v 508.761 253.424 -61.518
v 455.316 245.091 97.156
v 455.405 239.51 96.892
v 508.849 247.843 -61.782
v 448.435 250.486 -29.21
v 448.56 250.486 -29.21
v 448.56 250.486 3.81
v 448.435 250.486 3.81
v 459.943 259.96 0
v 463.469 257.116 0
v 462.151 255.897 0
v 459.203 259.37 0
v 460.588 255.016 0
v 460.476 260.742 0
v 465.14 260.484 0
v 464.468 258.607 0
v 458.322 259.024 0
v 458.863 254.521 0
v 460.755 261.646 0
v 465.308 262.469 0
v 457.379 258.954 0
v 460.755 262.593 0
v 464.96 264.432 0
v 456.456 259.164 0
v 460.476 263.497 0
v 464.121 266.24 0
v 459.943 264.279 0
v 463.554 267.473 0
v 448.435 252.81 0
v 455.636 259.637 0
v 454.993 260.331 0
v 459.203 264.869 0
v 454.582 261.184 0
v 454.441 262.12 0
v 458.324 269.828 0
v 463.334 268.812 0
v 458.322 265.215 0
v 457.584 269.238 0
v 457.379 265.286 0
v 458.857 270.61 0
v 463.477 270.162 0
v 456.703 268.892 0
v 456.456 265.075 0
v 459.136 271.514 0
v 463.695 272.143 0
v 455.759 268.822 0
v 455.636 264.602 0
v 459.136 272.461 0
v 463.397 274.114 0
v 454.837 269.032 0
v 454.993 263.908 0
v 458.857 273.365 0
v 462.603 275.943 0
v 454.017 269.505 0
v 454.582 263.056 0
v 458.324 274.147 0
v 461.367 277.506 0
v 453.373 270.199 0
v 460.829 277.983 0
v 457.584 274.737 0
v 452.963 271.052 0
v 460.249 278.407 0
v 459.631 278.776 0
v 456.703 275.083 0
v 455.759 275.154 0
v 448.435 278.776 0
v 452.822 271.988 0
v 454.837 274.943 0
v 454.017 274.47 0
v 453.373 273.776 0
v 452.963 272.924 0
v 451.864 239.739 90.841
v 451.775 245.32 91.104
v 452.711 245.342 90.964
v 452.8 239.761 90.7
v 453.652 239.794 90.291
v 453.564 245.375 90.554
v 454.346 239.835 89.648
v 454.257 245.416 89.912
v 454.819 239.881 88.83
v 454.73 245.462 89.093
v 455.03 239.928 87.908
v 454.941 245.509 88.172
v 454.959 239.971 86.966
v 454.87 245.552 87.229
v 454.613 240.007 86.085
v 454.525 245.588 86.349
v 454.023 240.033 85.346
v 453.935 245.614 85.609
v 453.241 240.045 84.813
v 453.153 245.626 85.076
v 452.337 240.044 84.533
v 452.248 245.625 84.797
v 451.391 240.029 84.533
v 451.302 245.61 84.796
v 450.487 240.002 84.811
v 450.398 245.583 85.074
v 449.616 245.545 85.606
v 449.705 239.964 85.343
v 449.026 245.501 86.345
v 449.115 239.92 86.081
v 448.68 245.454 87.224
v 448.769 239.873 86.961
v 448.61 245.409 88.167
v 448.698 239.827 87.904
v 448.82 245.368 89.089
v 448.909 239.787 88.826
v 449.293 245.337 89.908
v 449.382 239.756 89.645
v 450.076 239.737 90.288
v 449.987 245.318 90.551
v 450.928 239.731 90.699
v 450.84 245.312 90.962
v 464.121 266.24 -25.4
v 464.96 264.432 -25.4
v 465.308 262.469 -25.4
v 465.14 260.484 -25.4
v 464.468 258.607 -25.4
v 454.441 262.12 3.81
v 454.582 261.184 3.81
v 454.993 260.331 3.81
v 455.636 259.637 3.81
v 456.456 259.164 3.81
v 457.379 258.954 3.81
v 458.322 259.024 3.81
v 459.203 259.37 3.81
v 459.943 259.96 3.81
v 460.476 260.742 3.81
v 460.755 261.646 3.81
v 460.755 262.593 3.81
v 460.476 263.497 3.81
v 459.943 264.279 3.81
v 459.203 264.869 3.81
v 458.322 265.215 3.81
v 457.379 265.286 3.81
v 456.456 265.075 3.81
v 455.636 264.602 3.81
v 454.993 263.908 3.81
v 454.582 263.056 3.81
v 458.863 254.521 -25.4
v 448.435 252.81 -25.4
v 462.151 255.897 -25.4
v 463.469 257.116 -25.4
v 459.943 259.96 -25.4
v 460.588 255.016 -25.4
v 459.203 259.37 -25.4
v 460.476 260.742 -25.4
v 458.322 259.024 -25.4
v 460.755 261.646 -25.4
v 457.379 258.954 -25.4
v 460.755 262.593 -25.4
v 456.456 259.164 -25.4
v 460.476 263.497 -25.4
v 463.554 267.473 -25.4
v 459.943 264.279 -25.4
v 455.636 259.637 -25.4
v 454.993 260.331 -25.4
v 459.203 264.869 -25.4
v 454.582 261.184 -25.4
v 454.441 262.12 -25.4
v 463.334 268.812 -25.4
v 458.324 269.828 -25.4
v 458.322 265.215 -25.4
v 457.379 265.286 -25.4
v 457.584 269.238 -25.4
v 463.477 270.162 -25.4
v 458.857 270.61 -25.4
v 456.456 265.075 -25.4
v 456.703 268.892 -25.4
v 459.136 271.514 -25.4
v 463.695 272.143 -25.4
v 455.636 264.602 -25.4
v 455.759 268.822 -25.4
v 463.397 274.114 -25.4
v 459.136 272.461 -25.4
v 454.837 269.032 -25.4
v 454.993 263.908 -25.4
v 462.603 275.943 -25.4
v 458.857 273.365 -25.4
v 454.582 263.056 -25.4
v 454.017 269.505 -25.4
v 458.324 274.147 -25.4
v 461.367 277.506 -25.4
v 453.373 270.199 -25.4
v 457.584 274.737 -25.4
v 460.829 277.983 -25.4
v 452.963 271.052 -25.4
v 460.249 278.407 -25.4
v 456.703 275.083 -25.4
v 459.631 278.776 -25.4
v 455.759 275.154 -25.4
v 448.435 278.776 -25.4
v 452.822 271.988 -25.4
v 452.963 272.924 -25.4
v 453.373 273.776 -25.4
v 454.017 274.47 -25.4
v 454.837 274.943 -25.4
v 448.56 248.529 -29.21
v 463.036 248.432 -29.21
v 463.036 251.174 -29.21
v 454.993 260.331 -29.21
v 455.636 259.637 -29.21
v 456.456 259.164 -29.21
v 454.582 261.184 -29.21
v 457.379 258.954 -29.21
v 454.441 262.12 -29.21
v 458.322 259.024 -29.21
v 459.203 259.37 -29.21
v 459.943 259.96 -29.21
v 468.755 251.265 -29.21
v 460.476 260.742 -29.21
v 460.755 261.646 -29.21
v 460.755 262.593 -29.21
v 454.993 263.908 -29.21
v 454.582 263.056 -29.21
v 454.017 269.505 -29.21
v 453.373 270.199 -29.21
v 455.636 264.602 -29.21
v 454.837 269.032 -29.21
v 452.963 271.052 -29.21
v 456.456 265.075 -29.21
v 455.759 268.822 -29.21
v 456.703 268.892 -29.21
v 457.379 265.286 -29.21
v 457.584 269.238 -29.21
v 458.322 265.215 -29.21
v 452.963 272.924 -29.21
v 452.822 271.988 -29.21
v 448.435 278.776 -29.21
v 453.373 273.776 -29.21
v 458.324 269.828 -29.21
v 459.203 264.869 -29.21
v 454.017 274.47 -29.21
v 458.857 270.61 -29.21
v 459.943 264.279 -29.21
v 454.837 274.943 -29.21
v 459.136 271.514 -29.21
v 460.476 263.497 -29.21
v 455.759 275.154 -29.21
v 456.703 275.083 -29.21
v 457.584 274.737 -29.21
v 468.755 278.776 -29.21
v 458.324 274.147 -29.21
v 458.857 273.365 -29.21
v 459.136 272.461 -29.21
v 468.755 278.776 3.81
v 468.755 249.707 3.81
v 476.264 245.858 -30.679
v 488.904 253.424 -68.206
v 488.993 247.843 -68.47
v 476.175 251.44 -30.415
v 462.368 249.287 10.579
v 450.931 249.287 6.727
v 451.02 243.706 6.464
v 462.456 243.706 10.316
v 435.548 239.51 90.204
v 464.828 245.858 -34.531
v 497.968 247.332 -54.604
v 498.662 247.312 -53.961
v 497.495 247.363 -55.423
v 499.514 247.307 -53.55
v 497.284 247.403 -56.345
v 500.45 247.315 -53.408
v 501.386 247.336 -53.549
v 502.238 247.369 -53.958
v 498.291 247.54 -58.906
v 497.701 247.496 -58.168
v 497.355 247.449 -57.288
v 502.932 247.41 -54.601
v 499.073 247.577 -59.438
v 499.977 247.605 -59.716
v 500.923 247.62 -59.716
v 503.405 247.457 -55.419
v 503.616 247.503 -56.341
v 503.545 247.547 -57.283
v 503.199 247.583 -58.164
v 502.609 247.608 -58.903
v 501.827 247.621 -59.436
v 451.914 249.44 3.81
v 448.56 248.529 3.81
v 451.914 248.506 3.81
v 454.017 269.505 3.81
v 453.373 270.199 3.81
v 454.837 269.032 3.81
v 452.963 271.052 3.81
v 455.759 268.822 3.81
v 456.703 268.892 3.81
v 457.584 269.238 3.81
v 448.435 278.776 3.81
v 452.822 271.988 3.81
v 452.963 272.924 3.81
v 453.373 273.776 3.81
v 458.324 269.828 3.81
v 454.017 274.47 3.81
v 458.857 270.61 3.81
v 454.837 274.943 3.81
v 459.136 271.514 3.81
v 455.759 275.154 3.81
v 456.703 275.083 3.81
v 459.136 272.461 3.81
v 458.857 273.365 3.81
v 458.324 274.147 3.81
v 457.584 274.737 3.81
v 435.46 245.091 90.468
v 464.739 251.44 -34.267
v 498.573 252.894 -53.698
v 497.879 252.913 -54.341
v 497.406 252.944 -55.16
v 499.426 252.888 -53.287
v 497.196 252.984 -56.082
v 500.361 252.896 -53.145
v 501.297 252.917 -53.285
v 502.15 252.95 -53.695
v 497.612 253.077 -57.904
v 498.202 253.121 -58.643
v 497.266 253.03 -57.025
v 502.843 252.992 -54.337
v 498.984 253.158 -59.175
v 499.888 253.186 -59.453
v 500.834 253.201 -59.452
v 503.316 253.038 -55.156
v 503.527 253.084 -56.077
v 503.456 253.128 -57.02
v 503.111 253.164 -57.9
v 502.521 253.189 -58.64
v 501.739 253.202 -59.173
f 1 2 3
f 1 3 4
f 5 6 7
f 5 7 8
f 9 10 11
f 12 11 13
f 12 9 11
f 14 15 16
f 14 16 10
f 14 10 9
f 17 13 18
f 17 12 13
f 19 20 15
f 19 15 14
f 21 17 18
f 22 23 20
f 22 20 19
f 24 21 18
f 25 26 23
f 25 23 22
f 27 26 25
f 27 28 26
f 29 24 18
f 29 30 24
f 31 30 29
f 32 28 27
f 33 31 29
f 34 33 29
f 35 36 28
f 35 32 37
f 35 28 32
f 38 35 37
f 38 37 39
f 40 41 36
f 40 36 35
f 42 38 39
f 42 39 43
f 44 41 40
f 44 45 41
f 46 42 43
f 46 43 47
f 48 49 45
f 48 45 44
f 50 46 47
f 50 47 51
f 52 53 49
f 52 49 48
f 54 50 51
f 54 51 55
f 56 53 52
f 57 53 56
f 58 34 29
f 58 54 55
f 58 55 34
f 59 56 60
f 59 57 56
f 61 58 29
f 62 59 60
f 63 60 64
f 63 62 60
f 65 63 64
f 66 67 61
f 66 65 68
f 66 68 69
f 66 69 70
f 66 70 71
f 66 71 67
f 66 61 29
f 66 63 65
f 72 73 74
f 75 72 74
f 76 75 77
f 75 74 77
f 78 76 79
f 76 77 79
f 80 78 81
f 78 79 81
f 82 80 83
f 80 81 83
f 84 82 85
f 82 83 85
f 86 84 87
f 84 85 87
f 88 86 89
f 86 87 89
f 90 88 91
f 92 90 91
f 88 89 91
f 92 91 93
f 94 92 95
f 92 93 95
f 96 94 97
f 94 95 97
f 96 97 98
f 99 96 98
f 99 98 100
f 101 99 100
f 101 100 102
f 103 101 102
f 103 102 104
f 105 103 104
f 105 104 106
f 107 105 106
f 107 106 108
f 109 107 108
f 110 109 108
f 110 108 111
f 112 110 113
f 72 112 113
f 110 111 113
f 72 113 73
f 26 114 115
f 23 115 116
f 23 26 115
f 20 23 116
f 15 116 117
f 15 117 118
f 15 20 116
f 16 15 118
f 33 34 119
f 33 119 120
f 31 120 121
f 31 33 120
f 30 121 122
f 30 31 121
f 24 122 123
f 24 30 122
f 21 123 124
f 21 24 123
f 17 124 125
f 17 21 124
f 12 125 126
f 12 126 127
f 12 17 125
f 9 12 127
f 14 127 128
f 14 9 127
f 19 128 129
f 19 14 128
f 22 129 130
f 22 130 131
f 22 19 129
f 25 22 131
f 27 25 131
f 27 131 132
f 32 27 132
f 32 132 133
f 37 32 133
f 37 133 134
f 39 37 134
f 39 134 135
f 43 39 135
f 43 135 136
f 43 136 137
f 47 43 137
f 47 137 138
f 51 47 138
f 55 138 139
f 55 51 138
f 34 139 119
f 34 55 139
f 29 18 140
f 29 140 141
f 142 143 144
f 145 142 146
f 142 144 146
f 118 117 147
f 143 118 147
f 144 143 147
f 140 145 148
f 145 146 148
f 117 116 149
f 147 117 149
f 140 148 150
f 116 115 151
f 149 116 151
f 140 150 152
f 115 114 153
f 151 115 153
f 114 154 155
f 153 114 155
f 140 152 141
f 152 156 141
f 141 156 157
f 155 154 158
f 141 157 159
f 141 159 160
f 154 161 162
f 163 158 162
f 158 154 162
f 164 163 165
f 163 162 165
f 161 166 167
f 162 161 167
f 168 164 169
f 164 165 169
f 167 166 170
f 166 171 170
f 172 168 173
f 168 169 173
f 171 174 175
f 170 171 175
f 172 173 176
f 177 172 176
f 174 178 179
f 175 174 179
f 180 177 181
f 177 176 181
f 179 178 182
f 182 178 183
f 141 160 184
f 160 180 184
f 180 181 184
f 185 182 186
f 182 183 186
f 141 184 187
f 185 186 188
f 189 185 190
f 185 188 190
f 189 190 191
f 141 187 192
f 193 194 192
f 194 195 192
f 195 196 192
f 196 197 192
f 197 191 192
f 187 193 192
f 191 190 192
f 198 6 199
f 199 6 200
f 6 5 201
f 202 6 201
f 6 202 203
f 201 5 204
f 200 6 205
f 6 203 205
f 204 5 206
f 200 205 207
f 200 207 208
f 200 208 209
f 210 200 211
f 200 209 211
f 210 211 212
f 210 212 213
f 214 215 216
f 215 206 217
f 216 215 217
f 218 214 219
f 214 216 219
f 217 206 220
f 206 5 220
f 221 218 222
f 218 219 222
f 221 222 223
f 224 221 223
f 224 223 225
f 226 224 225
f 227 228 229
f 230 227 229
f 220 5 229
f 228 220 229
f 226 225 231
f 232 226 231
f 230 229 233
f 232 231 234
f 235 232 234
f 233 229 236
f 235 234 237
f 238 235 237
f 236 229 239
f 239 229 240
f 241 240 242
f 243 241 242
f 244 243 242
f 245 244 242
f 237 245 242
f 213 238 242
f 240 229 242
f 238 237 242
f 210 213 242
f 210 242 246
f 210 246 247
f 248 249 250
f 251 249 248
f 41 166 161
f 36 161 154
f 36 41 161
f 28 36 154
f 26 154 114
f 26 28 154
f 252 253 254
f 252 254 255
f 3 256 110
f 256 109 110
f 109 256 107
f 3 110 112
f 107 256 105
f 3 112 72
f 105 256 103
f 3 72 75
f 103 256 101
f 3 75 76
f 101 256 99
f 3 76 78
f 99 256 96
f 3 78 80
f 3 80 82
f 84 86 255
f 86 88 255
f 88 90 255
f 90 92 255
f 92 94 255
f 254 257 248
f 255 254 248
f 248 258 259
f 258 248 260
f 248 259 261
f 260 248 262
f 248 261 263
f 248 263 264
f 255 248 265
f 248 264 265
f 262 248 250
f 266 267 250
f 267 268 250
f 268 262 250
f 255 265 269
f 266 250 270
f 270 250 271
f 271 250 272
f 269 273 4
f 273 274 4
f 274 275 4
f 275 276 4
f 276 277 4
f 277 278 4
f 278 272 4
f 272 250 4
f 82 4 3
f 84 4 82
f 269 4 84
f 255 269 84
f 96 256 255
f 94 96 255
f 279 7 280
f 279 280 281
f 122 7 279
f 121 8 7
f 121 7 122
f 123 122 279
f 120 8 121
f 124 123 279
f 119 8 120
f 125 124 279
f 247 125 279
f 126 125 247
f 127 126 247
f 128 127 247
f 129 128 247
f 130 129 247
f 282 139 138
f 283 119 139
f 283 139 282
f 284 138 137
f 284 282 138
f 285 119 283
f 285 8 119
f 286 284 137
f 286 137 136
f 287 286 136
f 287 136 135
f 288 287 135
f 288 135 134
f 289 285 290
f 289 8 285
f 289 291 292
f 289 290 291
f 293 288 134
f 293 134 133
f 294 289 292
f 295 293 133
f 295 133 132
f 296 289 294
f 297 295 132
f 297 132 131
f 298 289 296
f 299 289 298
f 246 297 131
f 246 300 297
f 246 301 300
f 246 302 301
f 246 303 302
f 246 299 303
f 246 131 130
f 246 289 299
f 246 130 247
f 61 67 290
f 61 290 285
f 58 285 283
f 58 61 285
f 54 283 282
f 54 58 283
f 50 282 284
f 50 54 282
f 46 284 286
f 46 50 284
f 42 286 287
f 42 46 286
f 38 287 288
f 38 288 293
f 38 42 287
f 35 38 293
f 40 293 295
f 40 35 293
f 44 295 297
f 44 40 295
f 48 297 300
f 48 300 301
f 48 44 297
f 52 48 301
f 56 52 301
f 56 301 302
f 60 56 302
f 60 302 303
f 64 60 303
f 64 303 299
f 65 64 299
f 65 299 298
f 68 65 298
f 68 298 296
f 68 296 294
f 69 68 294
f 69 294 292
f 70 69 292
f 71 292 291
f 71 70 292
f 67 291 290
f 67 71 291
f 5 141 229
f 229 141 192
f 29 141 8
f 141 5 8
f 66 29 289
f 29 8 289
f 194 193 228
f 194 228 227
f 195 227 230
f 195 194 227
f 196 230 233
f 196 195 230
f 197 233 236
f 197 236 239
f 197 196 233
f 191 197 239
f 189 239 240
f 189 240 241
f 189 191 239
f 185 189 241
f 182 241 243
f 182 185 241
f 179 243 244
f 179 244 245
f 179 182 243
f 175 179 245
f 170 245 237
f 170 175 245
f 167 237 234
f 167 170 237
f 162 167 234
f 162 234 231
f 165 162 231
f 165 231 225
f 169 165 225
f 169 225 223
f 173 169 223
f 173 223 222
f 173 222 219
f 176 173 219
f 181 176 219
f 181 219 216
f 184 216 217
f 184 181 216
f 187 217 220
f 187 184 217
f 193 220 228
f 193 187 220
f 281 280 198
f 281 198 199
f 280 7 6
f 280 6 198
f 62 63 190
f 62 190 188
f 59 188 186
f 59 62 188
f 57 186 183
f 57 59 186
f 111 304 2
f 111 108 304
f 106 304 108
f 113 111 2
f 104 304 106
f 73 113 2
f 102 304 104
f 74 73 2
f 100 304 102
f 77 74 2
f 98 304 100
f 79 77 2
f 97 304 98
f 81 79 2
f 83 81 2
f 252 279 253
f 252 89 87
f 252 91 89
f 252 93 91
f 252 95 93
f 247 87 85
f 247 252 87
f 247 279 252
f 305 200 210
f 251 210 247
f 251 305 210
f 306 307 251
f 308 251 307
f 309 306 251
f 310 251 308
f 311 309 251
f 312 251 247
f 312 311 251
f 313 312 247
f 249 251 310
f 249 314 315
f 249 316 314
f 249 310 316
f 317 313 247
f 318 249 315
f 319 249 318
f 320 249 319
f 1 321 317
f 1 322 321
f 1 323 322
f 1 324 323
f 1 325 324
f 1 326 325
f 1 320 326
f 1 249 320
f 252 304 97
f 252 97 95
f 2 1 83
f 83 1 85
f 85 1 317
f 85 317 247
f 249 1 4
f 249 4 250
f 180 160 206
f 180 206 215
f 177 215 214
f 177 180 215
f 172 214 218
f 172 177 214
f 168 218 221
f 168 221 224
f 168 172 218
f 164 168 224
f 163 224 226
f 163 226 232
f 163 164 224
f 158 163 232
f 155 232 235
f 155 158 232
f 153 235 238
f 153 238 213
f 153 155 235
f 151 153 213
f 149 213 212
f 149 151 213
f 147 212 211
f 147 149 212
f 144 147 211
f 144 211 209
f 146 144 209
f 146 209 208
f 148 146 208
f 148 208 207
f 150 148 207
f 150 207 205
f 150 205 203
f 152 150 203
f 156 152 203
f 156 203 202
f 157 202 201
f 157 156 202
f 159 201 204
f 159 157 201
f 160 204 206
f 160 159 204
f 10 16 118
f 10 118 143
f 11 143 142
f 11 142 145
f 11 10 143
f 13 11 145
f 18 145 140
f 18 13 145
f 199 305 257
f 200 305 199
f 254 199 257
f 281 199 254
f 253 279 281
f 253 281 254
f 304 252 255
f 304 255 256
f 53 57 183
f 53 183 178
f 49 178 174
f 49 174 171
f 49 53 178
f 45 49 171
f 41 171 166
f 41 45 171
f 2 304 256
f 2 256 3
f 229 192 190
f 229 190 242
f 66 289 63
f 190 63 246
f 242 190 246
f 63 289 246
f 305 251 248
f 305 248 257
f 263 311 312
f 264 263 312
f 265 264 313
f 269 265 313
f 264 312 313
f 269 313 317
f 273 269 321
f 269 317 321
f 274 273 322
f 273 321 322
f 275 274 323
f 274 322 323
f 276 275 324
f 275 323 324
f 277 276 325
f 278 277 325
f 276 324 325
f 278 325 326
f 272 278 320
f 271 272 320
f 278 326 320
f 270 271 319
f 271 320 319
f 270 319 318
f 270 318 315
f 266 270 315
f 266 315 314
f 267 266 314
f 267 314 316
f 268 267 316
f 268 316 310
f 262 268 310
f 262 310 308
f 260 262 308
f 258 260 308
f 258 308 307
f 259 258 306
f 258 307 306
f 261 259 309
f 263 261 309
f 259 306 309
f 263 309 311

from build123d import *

# Parameters (mm, degrees)
BOSS_EXTRUDE1_DEPTH = 29.21
SKETCH2_R           = 3.175
BOSS_EXTRUDE2_DEPTH = 3.81
SKETCH3_R           = 3.175
BOSS_EXTRUDE3_DEPTH = 3.81
SKETCH4_R           = 3.175
BOSS_EXTRUDE4_DEPTH = 5.588
BOSS_EXTRUDE5_DEPTH = 33.02


with BuildPart() as part:
    # Sketch1 → Boss-Extrude1 (new body)
    with BuildSketch(Plane.XY):
        with BuildLine():
            Line((468.75530918, 278.776071532), (459.631228606, 278.776071532))
            ThreePointArc((459.631228606, 278.776071532), (460.543620658, 278.201967285), (461.366897066, 277.506071532))
            ThreePointArc((461.366897066, 277.506071532), (463.397272377, 274.114329254), (463.477224231, 270.162121354))
            ThreePointArc((463.477224231, 270.162121354), (463.399405765, 268.135304283), (464.120754615, 266.239598875))
            ThreePointArc((464.120754615, 266.239598875), (465.307742726, 262.469481888), (464.467858916, 258.607187485))
            ThreePointArc((464.467858916, 258.607187485), (462.151375158, 255.897407535), (458.862647092, 254.521445295))
            Line((458.862647092, 254.521445295), (448.43530918, 252.810420021))
            Line((448.43530918, 252.810420021), (448.43530918, 250.486101833))
            Line((448.43530918, 250.486101833), (468.75530918, 250.486101833))
            Line((468.75530918, 250.486101833), (468.75530918, 278.776071532))
        make_face()
    extrude(amount=-BOSS_EXTRUDE1_DEPTH)

    # Sketch2 → Boss-Extrude2 (add)
    with BuildSketch(Plane.XY):
        Polygon((448.43530918, 252.810420021), (448.43530918, 278.776071532), (468.75530918, 278.776071532), (468.75530918, 250.486101833), (448.43530918, 250.486101833), align=None)
        with Locations(Location((455.996603091, 271.987703521, 0), (0, 0, 180))):
            Circle(SKETCH2_R, mode=Mode.SUBTRACT)
        with Locations(Location((457.615851502, 262.119672583, 0), (0, 0, 180))):
            Circle(SKETCH2_R, mode=Mode.SUBTRACT)
    extrude(amount=BOSS_EXTRUDE2_DEPTH)

    # Sketch3 → Boss-Extrude3 (add)
    # profile 1 of 3: a face of its own
    with BuildSketch(Plane(origin=(0, 0, -25.4), x_dir=(-1, 0, 0), z_dir=(0, 0, -1))):
        with BuildLine():
            Line((-464.467858916, 258.607187485), (-448.43530918, 255.976401177))
            Line((-448.43530918, 255.976401177), (-448.43530918, 275.384123064))
            Line((-448.43530918, 275.384123064), (-461.366897066, 277.506071532))
            ThreePointArc((-461.366897066, 277.506071532), (-463.397272377, 274.114329254), (-463.477224231, 270.162121354))
            ThreePointArc((-463.477224231, 270.162121354), (-463.399405765, 268.135304283), (-464.120754615, 266.239598875))
            ThreePointArc((-464.120754615, 266.239598875), (-465.307742726, 262.469481888), (-464.467858916, 258.607187485))
        make_face()
        with Locations((-457.615851502, 262.119672583)):
            Circle(SKETCH3_R, mode=Mode.SUBTRACT)
        with Locations((-455.996603091, 271.987703521)):
            Circle(SKETCH3_R, mode=Mode.SUBTRACT)
    # profile 2 of 3: a face of its own
    with BuildSketch(Plane(origin=(0, 0, -25.4), x_dir=(-1, 0, 0), z_dir=(0, 0, -1))):
        with BuildLine():
            Line((-458.862647092, 254.521445295), (-448.43530918, 252.810420021))
            Line((-448.43530918, 252.810420021), (-448.43530918, 255.976401177))
            Line((-448.43530918, 255.976401177), (-464.467858916, 258.607187485))
            ThreePointArc((-464.467858916, 258.607187485), (-462.151375158, 255.897407535), (-458.862647092, 254.521445295))
        make_face()
    # profile 3 of 3: a face of its own
    with BuildSketch(Plane(origin=(0, 0, -25.4), x_dir=(-1, 0, 0), z_dir=(0, 0, -1))):
        with BuildLine():
            Line((-461.366897066, 277.506071532), (-448.43530918, 275.384123064))
            Line((-448.43530918, 275.384123064), (-448.43530918, 278.776071532))
            Line((-448.43530918, 278.776071532), (-459.631228606, 278.776071532))
            ThreePointArc((-459.631228606, 278.776071532), (-460.543620658, 278.201967285), (-461.366897066, 277.506071532))
        make_face()
    extrude(amount=BOSS_EXTRUDE3_DEPTH)

    # Sketch4 → Boss-Extrude4 (add)
    with BuildSketch(Plane(origin=(-3.84203447, 241.841104975, 11.406767954), x_dir=(0.9998741117550617, 0.015849347043774307, 0.0007475562269394091), z_dir=(-0.015866967007794316, 0.9987637706378837, 0.04710806533037044))):
        Polygon((459.215763784, -85.500450968), (512.667124492, 73.389830794), (492.808231658, 80.070446074), (480.07788451, 42.228033485), (468.640206694, 46.075716527), (454.8306113, 5.025115122), (466.268289117, 1.17743208), (439.35687095, -78.819835688), align=None)
        with Locations(Location((455.674707496, -76.269609027, 0), (0, 0, 270))):
            Circle(SKETCH4_R, mode=Mode.SUBTRACT)
        with Locations(Location((504.266853595, 68.176101666, 0), (0, 0, 270))):
            Circle(SKETCH4_R, mode=Mode.SUBTRACT)
    extrude(amount=-BOSS_EXTRUDE4_DEPTH)

    # Sketch5 → Boss-Extrude5 (add)
    with BuildSketch(Plane.XY.offset(3.81)):
        Polygon((468.75530918, 250.486101833), (448.560469366, 250.486101833), (448.560469366, 248.52896412), (468.75530918, 248.393245925), align=None)
    extrude(amount=-BOSS_EXTRUDE5_DEPTH)


solid = part.part
